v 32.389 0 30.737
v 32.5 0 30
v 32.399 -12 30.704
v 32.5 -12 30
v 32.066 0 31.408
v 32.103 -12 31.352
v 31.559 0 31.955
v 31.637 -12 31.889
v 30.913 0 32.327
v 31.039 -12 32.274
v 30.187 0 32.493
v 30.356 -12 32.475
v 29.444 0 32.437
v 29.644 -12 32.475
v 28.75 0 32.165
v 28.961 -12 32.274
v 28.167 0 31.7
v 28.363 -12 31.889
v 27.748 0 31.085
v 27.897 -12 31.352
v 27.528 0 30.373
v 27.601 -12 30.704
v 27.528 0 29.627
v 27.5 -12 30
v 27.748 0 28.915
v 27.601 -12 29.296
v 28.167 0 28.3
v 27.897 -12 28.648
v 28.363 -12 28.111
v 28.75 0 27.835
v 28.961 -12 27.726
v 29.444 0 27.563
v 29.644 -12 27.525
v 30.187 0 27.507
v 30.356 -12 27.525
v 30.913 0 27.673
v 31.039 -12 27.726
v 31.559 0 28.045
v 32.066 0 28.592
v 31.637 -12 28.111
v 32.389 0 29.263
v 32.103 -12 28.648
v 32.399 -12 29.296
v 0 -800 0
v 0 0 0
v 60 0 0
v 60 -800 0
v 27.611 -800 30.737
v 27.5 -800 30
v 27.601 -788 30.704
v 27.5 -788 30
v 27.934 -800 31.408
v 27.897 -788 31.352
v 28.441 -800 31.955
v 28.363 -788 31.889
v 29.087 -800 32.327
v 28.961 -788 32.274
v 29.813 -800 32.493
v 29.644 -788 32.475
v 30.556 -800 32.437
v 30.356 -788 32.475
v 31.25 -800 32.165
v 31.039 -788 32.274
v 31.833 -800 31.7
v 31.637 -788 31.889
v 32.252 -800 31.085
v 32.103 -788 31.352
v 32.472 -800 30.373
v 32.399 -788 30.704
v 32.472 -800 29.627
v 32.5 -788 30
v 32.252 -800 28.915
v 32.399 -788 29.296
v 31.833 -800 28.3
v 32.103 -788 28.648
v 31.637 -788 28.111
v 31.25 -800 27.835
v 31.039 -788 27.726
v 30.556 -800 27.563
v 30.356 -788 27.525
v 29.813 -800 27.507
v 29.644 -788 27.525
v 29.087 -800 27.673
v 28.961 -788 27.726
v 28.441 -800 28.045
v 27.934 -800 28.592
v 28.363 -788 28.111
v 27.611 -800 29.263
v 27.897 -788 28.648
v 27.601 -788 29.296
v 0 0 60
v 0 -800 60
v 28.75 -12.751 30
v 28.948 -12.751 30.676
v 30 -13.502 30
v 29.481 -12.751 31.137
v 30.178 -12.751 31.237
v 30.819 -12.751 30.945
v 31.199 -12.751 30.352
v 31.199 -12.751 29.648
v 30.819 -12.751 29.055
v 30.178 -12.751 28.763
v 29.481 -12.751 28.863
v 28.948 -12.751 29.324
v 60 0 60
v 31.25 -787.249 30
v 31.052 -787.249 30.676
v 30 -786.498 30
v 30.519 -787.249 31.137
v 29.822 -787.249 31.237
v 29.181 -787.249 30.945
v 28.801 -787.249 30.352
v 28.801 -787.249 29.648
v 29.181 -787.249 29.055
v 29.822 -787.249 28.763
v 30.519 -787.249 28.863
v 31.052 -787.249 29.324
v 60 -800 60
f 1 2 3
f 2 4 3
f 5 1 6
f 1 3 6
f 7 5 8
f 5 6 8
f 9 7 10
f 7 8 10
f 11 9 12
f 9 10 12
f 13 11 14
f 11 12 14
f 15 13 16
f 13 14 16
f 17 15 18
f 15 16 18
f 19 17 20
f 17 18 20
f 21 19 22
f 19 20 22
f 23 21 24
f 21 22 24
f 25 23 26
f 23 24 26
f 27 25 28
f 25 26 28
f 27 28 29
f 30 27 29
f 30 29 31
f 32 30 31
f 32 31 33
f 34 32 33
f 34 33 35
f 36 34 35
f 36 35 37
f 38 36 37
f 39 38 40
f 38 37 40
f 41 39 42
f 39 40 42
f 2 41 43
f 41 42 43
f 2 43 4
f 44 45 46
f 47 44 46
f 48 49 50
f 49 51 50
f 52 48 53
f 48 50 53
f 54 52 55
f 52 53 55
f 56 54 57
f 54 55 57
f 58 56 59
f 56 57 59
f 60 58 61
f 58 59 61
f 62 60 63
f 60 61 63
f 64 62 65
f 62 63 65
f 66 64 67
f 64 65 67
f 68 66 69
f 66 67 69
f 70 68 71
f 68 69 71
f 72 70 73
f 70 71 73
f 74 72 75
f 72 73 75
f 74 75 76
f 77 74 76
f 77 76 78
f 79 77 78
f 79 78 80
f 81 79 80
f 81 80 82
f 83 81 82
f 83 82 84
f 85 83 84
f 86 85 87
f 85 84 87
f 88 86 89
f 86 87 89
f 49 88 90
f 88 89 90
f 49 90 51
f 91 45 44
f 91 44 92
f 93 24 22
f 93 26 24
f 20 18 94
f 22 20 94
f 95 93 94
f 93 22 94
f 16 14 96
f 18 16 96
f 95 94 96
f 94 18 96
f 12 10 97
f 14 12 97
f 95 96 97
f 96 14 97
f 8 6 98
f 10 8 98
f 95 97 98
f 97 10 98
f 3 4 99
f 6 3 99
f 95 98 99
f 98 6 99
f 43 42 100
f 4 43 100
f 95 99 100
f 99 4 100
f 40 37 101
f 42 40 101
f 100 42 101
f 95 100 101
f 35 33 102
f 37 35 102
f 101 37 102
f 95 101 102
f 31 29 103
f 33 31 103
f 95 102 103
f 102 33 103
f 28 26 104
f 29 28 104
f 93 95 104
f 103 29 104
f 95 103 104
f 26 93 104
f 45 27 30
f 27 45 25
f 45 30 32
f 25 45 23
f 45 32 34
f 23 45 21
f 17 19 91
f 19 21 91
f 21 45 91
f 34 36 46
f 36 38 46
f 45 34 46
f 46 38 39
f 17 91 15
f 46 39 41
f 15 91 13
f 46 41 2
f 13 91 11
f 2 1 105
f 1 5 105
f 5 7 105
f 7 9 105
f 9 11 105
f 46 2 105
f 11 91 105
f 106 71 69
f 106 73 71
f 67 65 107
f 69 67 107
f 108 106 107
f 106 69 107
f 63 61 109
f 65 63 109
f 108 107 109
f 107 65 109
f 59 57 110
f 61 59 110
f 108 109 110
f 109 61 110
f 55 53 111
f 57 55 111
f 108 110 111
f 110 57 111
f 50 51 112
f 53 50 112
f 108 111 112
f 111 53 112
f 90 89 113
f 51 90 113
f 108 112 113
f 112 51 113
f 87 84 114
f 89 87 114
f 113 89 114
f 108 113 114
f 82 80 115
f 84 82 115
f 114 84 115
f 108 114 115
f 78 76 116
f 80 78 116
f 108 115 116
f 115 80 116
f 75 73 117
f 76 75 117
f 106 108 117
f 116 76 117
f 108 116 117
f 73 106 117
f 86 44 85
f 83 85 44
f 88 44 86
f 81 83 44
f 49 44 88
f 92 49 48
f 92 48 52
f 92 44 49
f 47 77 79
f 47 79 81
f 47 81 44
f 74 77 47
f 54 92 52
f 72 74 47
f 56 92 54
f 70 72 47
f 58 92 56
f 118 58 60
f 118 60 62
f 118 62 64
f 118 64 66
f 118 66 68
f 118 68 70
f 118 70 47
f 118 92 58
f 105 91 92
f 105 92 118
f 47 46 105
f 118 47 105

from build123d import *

# Parameters (mm, degrees)
F3_W           = 60
F3_H           = 60
F4_DEPTH       = 800
F7_D           = 5
F7_DEPTH       = 12
F7_TIP         = 1.5021515476
F7_ON_F5_D     = 5
F7_ON_F5_DEPTH = 12
F7_ON_F5_TIP   = 1.5021515476


with BuildPart() as f4:
    # F3 (on Front) → F4 (new body)
    with BuildSketch(Plane.XZ):
        with Locations((30, 30)):
            Rectangle(F3_W, F3_H)
    extrude(amount=F4_DEPTH)

    # F7
    with Locations(Plane.XZ.offset(800)):
        with Locations((30, 30)):
            Hole(F7_D / 2, depth=F7_DEPTH)
            with Locations((0, 0, -(F7_DEPTH + F7_TIP / 2))):  # 118° drill point
                Cone(0, F7_D / 2, F7_TIP, mode=Mode.SUBTRACT)

    # F7 on F5
    with Locations(Plane(origin=(0, 0, 0), x_dir=(-1, 0, 0), z_dir=(0, 1, 0))):
        with Locations((-30, 30)):
            Hole(F7_ON_F5_D / 2, depth=F7_ON_F5_DEPTH)
            with Locations((0, 0, -(F7_ON_F5_DEPTH + F7_ON_F5_TIP / 2))):  # 118° drill point
                Cone(0, F7_ON_F5_D / 2, F7_ON_F5_TIP, mode=Mode.SUBTRACT)


solid = f4.part
